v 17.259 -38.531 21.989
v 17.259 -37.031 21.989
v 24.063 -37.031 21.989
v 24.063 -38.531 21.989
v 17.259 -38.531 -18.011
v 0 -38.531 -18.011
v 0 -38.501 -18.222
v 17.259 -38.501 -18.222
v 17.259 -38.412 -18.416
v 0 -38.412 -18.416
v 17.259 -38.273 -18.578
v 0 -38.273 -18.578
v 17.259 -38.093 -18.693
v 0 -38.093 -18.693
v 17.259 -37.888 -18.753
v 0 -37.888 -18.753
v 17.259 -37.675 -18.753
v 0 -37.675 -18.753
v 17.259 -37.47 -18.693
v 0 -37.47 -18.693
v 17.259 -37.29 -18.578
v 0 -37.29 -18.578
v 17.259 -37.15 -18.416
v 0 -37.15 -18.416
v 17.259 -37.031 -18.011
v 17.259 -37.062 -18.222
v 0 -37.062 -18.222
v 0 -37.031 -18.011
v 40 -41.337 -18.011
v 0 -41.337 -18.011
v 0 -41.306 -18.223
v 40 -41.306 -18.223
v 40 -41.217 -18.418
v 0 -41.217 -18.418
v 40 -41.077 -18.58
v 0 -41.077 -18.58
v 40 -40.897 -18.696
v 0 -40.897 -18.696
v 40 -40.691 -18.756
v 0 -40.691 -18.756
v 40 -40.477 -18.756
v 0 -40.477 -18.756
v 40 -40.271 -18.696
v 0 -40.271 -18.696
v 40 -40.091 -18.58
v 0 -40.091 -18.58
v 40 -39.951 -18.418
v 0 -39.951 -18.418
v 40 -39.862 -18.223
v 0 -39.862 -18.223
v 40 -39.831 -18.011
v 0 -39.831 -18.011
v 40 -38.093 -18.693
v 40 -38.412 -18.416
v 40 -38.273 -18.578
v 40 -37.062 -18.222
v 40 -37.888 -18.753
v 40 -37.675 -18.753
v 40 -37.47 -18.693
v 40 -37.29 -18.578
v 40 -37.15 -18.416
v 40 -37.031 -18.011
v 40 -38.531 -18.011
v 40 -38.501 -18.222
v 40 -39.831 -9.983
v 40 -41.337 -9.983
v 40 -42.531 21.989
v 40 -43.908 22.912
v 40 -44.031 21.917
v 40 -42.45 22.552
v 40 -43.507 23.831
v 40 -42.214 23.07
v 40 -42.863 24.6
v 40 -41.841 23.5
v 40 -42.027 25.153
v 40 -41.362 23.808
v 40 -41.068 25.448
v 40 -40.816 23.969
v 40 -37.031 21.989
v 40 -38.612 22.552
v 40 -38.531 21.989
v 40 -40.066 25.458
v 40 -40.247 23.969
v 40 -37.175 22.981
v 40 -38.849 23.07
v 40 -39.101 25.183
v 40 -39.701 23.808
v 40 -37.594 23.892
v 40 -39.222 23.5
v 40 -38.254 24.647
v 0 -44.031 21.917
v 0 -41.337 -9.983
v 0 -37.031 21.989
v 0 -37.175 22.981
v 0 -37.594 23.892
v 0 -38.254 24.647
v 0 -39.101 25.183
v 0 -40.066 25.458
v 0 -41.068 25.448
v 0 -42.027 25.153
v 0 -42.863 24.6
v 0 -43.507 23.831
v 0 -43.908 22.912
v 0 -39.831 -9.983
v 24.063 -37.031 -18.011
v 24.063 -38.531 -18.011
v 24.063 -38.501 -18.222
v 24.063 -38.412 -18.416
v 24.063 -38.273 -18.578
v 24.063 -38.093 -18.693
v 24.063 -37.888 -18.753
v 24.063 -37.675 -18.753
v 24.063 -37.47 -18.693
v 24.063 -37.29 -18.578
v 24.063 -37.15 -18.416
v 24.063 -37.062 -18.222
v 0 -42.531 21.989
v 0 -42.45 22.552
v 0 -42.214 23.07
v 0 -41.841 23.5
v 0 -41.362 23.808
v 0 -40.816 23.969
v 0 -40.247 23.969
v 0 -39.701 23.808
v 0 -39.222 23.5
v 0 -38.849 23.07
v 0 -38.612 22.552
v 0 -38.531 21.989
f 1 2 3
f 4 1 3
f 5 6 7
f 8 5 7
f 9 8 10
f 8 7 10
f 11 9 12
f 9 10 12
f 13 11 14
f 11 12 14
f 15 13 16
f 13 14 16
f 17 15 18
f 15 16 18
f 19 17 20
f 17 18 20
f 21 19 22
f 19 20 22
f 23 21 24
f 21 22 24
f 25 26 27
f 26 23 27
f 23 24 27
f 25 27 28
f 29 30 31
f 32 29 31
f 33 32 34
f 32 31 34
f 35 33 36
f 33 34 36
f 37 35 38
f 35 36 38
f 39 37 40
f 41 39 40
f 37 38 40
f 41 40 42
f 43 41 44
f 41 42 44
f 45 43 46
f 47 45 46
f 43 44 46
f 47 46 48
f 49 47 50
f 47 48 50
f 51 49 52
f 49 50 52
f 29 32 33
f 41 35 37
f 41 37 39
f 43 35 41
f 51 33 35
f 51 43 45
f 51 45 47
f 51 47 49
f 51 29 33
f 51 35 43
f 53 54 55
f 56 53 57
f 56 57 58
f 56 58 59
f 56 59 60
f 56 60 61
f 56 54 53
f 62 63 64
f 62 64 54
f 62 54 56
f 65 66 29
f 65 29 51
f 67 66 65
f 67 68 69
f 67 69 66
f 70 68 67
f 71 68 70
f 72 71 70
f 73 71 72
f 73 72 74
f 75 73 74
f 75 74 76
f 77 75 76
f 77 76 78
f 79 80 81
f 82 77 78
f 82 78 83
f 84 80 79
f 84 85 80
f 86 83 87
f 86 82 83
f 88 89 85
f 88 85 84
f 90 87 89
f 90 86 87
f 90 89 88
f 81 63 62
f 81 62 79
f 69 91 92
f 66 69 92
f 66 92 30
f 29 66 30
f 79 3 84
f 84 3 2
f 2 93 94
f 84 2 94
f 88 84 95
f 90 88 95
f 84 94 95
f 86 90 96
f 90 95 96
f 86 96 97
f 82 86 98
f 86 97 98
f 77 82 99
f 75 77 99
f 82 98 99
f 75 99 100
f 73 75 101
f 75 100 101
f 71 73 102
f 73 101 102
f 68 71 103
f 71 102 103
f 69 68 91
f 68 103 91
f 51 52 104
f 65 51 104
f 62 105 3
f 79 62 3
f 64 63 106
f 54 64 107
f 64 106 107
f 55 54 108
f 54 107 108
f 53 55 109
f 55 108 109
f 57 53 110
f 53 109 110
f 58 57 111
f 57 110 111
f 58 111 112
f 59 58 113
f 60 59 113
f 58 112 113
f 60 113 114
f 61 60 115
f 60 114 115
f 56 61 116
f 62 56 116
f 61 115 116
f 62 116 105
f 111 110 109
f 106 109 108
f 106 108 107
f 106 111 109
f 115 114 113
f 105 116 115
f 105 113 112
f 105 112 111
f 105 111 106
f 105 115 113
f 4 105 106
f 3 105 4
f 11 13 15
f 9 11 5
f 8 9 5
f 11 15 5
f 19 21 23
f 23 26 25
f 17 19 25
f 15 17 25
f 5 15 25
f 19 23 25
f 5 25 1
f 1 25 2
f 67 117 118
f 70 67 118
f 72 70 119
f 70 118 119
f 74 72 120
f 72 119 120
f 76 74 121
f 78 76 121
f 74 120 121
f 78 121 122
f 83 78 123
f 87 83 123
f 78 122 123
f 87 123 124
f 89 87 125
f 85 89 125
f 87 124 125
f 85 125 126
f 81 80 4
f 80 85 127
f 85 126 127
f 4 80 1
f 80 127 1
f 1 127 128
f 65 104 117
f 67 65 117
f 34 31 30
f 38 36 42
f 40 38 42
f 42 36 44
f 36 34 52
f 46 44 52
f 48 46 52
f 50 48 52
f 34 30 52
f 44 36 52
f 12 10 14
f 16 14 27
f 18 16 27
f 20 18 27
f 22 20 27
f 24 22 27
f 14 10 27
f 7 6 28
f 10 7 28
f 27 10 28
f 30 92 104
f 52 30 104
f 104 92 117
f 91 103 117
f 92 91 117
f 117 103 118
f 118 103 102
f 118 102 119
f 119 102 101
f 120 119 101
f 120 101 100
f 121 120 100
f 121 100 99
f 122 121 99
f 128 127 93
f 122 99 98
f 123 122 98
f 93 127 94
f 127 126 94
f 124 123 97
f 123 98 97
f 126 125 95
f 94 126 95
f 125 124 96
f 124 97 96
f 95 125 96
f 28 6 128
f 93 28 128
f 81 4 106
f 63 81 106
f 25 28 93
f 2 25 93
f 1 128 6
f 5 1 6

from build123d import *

# Parameters (mm, degrees)
F1_DEPTH = 40
F2_W     = 6.804615
F2_H     = 50.8
F3_DEPTH = 39.5


with BuildPart() as f1:
    # F0 (on Right) → F1 (new body)
    with BuildSketch(Plane.YZ):
        with BuildLine():
            Line((-38.531435, 21.988993), (-38.531435, -18.011007))
            ThreePointArc((-38.531435, -18.011007), (-37.781435, -18.761007), (-37.031435, -18.011007))
            Line((-37.031435, -18.011007), (-37.031435, 21.988993))
            ThreePointArc((-37.031435, 21.988993), (-40.567433, 25.488808), (-44.030694, 21.917))
            Line((-44.030694, 21.917), (-41.336774, -9.982696))
            Line((-41.336774, -9.982696), (-41.336774, -18.011007))
            ThreePointArc((-41.336774, -18.011007), (-40.584104, -18.763676), (-39.831435, -18.011007))
            Line((-39.831435, -18.011007), (-39.831435, -9.982696))
            Line((-39.831435, -9.982696), (-42.531435, 21.988993))
            ThreePointArc((-42.531435, 21.988993), (-40.531435, 23.988993), (-38.531435, 21.988993))
        make_face()
    extrude(amount=F1_DEPTH)

    # F2 (on Front) → F3 (cut)
    with BuildSketch(Plane.XZ):
        with Locations((20.661171, -3.411007)):
            Rectangle(F2_W, F2_H)
    extrude(amount=F3_DEPTH, mode=Mode.SUBTRACT)


solid = f1.part
